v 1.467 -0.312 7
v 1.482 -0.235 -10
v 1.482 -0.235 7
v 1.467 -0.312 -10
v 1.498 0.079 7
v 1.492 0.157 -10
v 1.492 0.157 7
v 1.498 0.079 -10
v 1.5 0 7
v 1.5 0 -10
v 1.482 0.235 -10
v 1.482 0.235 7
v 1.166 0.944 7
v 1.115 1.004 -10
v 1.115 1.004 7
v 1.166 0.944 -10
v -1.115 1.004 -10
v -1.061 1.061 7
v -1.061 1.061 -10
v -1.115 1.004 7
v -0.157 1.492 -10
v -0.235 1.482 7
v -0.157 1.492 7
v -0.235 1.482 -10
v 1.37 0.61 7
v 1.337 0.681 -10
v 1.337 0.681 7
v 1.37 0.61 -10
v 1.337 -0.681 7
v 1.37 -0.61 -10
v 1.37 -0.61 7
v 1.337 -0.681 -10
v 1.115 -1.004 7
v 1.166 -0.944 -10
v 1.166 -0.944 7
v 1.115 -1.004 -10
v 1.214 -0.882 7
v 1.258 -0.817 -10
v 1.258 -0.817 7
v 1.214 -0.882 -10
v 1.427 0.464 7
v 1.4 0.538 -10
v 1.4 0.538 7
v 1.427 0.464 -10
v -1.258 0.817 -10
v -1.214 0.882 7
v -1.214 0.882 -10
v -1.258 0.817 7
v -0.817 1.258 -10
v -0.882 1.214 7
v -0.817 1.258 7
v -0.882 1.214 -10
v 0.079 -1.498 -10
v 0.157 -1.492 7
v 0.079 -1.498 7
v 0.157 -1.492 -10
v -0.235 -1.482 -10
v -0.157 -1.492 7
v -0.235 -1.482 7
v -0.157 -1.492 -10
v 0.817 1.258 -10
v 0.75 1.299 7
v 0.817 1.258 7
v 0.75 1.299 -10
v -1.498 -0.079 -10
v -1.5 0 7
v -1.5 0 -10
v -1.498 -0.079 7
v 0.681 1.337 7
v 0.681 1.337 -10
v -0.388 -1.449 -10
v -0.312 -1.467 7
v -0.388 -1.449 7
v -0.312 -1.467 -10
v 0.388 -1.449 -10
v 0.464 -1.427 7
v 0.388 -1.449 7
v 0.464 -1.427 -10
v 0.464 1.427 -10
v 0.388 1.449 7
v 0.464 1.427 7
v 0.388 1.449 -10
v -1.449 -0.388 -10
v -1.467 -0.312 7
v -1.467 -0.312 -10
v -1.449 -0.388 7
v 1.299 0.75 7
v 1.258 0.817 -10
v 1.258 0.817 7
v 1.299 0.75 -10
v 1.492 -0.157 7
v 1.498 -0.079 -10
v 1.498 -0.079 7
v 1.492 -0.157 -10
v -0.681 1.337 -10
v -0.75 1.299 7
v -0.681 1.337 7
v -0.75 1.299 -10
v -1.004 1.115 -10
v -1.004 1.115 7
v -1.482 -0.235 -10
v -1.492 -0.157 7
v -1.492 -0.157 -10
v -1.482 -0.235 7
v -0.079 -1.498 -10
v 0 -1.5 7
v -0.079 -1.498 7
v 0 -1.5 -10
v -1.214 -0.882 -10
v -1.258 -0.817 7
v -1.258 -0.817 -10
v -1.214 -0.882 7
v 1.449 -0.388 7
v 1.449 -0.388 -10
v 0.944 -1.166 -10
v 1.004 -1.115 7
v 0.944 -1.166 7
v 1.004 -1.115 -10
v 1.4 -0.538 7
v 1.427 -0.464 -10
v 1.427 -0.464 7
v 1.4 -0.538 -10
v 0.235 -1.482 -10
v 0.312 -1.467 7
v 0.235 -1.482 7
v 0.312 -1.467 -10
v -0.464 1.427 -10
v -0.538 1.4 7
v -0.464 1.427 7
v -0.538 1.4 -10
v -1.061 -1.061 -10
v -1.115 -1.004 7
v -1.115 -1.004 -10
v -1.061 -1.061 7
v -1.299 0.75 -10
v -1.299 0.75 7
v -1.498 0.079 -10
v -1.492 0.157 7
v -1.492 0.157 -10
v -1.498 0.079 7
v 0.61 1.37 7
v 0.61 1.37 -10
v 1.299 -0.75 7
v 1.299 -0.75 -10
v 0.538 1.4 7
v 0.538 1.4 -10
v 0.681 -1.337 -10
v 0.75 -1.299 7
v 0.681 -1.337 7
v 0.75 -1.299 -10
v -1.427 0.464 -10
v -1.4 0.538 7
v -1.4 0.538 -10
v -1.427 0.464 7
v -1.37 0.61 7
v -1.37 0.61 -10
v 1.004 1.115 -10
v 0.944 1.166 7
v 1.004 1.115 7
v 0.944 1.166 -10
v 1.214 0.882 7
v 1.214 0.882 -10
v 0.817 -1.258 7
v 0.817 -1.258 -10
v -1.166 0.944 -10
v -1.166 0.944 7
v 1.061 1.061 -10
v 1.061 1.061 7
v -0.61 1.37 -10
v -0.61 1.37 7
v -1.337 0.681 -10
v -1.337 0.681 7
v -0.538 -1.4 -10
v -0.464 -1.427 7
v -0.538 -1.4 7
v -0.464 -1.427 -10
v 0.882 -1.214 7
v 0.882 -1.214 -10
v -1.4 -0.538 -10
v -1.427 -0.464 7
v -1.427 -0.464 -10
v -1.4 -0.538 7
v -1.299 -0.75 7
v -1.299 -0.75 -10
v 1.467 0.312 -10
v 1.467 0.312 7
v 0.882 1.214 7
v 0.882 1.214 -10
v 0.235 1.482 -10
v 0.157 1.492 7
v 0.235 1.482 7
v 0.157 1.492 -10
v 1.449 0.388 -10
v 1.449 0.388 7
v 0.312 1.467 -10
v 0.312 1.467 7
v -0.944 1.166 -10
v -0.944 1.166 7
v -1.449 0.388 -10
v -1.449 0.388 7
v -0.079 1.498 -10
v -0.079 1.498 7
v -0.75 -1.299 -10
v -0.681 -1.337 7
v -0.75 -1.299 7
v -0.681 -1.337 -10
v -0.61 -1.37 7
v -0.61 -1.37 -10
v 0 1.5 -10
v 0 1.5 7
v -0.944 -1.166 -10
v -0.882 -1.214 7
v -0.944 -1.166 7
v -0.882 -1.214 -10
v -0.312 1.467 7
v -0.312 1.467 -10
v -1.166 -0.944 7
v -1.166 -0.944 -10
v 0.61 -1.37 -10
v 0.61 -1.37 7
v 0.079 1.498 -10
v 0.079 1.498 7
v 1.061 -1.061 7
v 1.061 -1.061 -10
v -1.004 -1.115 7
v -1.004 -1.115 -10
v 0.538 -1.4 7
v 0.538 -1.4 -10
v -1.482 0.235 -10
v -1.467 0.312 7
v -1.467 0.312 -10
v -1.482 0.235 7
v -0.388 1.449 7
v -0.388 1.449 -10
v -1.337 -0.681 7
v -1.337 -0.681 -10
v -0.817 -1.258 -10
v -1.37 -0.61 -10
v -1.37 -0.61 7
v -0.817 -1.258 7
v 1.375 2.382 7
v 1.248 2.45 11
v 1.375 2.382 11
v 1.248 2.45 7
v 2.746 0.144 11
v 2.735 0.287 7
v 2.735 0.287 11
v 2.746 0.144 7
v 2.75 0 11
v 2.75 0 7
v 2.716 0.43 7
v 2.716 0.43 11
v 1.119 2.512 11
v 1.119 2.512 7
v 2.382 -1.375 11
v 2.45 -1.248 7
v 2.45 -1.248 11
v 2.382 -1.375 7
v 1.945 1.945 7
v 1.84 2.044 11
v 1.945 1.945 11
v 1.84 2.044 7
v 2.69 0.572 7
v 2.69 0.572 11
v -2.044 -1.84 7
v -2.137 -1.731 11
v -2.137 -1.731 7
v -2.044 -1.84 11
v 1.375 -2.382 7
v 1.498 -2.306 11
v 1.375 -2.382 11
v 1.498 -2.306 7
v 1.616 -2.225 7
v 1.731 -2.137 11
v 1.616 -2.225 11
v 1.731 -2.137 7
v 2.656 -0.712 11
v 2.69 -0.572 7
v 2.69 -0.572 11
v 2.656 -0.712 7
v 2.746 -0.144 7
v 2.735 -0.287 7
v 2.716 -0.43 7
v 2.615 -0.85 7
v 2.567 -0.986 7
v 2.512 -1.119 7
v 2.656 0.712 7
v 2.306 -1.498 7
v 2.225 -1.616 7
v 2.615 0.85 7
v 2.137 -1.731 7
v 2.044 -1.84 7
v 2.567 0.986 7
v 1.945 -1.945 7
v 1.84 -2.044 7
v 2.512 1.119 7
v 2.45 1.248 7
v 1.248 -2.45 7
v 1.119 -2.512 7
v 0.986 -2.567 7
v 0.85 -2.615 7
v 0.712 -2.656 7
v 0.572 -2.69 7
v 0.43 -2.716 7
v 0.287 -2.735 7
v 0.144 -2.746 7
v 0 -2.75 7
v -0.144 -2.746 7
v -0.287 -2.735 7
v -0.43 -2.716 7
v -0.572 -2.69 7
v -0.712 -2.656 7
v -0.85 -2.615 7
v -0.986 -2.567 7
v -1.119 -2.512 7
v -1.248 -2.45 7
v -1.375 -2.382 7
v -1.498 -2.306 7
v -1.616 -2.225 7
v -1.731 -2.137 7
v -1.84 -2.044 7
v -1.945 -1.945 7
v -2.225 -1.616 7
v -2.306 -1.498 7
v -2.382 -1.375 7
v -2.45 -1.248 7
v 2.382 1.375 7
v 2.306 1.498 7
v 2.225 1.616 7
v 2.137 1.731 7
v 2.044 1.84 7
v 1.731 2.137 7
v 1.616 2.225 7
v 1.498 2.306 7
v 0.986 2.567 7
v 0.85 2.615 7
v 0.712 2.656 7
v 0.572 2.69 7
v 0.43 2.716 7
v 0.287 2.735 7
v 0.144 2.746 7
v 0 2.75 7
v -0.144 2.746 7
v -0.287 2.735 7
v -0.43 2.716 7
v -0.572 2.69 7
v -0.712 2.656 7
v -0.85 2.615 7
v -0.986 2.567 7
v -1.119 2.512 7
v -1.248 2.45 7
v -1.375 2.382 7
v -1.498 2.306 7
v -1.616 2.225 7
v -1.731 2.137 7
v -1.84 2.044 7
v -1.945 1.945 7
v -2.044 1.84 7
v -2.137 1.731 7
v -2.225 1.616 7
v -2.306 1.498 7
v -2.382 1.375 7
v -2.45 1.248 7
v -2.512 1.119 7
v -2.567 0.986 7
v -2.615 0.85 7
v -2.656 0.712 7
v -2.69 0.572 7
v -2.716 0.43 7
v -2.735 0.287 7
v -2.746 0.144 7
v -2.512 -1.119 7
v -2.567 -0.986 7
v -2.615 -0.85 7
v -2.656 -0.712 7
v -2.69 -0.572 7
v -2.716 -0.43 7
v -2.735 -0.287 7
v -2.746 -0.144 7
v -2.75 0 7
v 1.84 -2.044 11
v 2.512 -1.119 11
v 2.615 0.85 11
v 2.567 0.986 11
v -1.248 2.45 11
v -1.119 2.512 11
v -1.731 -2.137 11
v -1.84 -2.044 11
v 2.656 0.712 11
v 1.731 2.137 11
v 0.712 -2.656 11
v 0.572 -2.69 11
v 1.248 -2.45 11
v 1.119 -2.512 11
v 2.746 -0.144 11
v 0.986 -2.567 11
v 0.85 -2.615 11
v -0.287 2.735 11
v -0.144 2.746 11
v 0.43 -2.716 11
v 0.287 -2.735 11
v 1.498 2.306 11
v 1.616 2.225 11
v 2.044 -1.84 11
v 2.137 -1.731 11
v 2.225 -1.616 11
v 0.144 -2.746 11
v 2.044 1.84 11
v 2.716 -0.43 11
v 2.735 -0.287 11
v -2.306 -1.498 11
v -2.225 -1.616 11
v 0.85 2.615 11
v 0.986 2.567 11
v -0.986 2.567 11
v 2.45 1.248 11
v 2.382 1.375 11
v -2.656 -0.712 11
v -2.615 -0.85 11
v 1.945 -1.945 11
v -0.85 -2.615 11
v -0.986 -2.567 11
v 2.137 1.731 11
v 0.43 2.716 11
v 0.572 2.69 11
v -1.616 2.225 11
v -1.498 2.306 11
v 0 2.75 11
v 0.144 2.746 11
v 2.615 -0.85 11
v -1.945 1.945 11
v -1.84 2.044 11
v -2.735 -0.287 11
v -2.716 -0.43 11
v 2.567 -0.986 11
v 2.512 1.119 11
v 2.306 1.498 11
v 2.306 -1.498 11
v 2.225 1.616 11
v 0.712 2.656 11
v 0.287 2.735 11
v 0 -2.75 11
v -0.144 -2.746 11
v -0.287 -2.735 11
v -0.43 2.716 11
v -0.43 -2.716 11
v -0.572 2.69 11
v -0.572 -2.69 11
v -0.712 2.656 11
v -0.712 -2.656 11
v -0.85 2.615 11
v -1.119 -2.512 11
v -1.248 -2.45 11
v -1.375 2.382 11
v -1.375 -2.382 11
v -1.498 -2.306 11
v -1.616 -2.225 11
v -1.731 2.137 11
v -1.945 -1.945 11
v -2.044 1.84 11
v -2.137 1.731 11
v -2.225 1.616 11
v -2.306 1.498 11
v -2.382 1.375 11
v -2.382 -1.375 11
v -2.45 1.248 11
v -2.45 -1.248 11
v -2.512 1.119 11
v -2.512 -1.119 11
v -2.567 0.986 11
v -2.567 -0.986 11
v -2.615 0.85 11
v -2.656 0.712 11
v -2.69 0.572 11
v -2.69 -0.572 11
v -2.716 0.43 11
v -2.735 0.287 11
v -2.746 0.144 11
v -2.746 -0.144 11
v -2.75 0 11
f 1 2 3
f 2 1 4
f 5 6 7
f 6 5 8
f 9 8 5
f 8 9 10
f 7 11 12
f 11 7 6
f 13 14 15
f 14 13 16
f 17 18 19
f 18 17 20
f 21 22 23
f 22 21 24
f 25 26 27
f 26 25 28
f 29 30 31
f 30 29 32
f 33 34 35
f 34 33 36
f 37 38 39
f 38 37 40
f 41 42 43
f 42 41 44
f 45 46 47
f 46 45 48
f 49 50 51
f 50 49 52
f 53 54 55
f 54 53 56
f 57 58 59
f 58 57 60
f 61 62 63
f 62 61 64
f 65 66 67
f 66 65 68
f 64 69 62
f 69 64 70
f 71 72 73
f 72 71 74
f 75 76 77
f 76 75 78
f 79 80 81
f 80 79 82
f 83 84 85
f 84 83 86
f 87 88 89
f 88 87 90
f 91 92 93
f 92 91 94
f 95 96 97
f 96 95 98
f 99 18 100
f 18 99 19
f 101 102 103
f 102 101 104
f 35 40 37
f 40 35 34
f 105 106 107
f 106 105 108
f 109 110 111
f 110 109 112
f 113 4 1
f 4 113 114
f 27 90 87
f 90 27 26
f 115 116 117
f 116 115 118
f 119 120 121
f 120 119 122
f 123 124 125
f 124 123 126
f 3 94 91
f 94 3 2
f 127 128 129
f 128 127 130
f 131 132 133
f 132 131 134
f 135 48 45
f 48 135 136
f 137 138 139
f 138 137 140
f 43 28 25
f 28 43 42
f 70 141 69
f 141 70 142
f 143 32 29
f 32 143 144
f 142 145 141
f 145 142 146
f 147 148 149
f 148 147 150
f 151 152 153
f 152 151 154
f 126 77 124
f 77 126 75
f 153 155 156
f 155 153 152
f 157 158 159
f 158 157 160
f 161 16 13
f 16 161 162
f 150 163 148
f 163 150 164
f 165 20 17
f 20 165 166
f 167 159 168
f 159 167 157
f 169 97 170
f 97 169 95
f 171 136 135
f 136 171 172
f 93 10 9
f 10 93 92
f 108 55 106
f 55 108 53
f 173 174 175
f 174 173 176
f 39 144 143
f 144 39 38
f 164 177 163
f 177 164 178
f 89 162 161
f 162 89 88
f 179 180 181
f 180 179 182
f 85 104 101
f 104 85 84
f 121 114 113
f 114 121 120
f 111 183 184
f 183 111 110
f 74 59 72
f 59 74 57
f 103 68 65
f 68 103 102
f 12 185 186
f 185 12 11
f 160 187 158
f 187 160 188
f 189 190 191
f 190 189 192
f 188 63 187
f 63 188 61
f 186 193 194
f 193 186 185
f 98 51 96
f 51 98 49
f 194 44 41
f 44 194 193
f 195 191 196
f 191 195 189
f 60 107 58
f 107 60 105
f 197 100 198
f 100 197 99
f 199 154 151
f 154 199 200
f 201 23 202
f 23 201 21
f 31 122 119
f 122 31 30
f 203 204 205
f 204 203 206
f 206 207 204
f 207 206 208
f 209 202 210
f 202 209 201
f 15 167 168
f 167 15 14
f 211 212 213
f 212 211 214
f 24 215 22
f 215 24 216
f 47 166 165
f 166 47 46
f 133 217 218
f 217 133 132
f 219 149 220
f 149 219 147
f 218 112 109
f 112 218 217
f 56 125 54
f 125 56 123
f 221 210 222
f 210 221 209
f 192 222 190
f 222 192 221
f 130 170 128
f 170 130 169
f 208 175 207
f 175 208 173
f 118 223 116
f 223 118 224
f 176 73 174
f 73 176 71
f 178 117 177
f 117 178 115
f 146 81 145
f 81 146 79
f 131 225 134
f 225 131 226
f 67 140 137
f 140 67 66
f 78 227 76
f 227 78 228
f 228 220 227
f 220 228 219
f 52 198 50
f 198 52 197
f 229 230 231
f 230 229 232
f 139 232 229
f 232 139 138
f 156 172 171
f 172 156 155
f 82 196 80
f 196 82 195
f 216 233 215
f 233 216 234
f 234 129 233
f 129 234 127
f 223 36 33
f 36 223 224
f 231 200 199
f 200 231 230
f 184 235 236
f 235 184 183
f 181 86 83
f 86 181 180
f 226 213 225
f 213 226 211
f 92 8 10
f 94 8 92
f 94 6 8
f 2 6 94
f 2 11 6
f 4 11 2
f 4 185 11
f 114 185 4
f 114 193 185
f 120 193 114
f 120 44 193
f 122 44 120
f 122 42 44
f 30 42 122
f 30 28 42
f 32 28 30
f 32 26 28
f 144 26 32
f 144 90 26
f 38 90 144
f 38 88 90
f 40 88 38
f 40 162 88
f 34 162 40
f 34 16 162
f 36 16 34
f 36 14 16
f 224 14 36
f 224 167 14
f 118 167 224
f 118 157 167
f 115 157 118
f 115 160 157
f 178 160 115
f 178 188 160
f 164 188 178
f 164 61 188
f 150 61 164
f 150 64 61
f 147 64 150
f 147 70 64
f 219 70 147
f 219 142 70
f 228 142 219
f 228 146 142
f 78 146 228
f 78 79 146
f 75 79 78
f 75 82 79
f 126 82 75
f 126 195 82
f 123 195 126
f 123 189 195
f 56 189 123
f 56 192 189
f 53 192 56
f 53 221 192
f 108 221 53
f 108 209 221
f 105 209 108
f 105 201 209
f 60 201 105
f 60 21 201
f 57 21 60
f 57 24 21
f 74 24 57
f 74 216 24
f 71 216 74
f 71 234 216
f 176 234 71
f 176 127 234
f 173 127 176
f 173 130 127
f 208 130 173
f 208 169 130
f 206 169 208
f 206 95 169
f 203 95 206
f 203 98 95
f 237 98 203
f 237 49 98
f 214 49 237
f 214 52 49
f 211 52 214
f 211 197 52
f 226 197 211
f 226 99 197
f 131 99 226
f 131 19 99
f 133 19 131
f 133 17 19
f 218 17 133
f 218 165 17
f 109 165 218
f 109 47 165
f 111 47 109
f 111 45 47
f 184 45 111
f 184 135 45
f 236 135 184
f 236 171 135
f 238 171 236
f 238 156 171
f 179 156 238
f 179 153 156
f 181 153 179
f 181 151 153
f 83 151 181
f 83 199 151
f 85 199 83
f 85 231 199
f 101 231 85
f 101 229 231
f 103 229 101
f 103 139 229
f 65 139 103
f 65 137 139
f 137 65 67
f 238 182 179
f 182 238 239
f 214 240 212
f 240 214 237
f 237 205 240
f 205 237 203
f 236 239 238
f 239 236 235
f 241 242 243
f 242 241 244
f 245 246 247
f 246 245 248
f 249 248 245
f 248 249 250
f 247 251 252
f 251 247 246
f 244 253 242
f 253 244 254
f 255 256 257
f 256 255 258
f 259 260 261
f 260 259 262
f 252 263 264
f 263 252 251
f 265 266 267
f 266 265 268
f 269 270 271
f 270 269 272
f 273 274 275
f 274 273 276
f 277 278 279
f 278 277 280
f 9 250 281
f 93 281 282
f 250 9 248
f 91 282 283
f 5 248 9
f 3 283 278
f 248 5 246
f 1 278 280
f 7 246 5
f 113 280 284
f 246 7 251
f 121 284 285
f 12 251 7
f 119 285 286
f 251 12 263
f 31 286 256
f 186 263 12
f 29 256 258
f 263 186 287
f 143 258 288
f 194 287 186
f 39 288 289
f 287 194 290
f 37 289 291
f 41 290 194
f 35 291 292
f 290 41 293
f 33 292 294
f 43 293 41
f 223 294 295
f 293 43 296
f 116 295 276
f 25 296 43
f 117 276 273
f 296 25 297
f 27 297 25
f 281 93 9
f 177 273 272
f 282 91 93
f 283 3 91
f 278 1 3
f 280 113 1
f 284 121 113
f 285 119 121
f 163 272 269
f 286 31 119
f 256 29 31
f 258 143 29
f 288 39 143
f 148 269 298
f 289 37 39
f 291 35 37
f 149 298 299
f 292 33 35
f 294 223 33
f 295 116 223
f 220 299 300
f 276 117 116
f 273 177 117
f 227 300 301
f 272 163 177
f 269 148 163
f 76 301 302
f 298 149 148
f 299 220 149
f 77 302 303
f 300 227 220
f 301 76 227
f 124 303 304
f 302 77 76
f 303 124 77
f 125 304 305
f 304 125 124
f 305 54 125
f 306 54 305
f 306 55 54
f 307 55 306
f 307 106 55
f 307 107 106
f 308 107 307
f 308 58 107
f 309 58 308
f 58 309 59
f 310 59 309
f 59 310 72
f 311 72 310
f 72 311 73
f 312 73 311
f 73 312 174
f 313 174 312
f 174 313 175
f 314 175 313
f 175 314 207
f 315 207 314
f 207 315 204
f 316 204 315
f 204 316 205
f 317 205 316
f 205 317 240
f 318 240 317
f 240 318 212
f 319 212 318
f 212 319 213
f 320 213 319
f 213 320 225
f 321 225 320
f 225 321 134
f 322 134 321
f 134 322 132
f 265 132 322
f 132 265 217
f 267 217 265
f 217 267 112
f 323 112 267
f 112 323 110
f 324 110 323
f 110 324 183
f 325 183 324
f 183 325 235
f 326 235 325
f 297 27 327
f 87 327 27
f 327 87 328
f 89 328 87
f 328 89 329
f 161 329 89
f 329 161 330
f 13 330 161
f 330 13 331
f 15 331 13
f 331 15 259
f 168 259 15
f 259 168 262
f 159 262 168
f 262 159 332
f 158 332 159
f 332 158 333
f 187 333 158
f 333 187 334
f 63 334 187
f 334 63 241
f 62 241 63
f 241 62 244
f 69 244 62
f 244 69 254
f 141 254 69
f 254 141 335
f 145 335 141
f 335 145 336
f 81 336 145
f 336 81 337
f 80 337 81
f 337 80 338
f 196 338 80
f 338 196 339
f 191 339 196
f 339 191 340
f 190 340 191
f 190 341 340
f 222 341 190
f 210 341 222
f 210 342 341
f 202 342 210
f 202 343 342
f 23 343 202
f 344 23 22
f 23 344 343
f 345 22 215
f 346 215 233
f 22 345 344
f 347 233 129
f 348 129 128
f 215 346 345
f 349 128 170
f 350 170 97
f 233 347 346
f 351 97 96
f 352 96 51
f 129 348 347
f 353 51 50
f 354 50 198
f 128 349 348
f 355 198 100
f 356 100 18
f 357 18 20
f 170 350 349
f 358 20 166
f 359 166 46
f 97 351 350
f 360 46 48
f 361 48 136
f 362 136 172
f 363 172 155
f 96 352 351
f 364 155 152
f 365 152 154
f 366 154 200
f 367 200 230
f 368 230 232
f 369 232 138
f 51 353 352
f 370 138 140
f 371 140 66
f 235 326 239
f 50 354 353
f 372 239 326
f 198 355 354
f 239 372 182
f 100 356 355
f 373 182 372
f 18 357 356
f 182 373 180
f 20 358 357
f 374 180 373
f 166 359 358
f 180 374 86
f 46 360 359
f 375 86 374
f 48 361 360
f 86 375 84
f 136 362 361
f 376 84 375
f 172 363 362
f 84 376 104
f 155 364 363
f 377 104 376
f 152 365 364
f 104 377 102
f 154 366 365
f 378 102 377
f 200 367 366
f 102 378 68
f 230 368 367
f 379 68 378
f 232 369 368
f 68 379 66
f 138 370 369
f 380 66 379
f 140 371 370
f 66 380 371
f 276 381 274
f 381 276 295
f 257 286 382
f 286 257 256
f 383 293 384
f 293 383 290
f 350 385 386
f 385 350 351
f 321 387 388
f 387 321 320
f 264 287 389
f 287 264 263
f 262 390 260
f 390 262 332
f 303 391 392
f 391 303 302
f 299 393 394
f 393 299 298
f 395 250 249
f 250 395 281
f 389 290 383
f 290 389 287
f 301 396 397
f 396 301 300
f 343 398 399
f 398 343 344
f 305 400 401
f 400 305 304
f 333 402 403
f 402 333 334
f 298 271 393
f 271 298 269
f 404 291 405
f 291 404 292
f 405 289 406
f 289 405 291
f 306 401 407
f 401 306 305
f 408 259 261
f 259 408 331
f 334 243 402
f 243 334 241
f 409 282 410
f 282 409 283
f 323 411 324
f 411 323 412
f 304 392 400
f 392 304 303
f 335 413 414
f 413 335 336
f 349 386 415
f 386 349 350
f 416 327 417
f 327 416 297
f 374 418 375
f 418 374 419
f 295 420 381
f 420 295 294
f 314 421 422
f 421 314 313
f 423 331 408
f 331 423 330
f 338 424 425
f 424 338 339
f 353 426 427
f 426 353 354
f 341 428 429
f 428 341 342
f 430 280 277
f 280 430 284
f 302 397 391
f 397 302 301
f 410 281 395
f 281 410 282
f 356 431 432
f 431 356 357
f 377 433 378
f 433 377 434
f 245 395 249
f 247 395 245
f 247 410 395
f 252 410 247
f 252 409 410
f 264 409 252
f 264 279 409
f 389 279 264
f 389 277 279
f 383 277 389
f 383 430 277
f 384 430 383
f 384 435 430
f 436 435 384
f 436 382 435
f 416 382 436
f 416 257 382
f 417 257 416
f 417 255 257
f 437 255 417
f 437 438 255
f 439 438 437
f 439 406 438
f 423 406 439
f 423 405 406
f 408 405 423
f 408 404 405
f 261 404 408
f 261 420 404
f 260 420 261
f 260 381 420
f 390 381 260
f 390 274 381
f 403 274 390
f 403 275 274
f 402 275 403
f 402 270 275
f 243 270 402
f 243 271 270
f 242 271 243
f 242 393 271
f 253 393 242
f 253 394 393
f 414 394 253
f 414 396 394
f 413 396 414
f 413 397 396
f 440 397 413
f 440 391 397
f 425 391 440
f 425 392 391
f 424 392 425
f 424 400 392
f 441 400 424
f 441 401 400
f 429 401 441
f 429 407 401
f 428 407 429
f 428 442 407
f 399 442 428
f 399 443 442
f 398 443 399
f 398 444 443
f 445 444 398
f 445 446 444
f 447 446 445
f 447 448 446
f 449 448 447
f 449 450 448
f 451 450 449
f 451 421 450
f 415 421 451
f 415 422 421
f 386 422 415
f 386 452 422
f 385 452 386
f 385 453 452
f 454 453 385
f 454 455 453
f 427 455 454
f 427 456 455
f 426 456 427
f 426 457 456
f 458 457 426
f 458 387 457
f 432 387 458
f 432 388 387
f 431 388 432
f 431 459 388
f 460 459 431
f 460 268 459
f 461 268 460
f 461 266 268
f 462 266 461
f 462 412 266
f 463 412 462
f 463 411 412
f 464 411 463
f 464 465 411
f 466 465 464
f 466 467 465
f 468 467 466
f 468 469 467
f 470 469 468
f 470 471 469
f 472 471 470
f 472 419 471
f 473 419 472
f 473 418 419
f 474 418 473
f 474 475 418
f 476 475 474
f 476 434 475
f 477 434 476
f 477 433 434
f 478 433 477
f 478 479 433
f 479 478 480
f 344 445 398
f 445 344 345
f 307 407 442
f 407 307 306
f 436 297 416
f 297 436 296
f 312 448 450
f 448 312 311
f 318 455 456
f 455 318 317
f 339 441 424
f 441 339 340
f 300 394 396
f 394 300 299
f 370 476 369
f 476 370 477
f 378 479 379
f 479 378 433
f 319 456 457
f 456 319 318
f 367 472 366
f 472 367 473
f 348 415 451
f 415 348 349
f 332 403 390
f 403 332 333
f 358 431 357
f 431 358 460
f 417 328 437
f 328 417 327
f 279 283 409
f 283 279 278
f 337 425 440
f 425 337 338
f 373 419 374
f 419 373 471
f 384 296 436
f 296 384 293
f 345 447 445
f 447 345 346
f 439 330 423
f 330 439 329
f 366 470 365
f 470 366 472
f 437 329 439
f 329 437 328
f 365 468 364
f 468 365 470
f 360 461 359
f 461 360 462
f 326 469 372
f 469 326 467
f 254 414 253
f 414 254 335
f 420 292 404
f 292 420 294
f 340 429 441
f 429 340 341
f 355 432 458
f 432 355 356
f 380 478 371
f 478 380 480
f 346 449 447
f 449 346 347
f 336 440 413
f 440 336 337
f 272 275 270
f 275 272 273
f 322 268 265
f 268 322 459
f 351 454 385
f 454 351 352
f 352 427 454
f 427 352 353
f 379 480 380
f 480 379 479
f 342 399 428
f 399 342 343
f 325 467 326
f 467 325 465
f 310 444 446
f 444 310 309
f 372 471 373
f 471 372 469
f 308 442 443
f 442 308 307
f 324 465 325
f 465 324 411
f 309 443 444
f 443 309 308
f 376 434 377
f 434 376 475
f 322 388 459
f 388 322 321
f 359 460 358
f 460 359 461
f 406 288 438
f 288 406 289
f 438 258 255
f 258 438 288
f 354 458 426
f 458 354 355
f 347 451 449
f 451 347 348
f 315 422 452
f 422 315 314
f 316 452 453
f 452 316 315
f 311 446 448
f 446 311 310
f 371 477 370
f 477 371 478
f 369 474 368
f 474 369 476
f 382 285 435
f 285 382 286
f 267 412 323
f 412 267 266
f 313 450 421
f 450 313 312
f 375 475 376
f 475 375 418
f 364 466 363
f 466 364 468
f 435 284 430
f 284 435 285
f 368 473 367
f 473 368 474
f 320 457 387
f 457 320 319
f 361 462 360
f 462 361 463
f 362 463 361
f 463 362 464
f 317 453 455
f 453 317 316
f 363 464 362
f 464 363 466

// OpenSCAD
/* Dimensions for Cylinder Screws with Hex head (DIN 912, ISO 4762)

please use function cylinder_screw() to retrieve the basic dimensions.

Example

result = get_screw("M3");

result == [
    "M3",   // name
    3,      // shaft diameter
    5.5,    // head diameter
    3       // head height
];
*/

$fn = 120;

METRIC_CYLINDER_SCREWS = [
    [ "M1.4", 1.4, 2.6, 1.4],
    [ "M1.6", 1.6, 3,   1.6],
    [ "M2",   2,   3.8, 2],
    [ "M2.5", 2.5, 4.5, 2.5],
    [ "M3",   3,   5.5, 3],
    [ "M4",   4,   7,   4],
    [ "M5",   5,   8.5, 5],
    [ "M6",   6,  10,   6],
    [ "M8",   8,  13,   8],
    ["M10",  10,  16,  10],
    ["M12",  12,  18,  12],
    ["M14",  14,  21,  14],
    ["M16",  16,  24,  16],
    ["M18",  18,  27,  18],
    ["M20",  20,  30,  20],
    ["M22",  22,  33,  22],
    ["M24",  24,  36,  24],
    ["M27",  27,  40,  27],
    ["M30",  30,  45,  30],
    ["M33",  33,  50,  33],
    ["M36",  36,  54,  36],
    ["M39",  39,  58,  39],
    ["M42",  42,  63,  42],
    ["M45",  45,  68,  45],
    ["M52",  52,  78,  52],
    ["M56",  56,  84,  56],
    ["M64",  64,  96,  64],
    ["M72",  72, 108,  72],
];

function _get_cylinder_screw_index(which) = search([which], METRIC_CYLINDER_SCREWS, index_col_num=1);
function cylinder_screw(which) = METRIC_CYLINDER_SCREWS[_get_cylinder_screw_index(which)[0]];


module cylinder_screw_bore_hole(size, length, head=true, slack=0, elongate_head=1) {
    /* generates a form for a cylinder screw bore hole

    The screw will be centered on x and y axis. On the z-axis it is centered
    according to the length of the screw, so excluding the elongated head
    as specified by parameter.

    size:           screw size like "M3"
    length:         length of the screw, including head
    head:           include screw head
    slack:          add this size to the hole diameters (shaft and head)
    elongate_head:  add this extra length to the head
    */
    dimensions = cylinder_screw(size);
    shaft_diameter = dimensions[1];
    head_diameter = dimensions[2];
    head_length = min(length, dimensions[3]);
    head_z_offset = (length - head_length + elongate_head) / 2;

    cylinder(length, d=shaft_diameter + slack, center=true);
    if (head) {
        translate([0, 0, head_z_offset])
            cylinder(head_length + elongate_head, d=head_diameter + slack, center=true);
    }
}


cylinder_screw_bore_hole("M3" ,20, head=true);
